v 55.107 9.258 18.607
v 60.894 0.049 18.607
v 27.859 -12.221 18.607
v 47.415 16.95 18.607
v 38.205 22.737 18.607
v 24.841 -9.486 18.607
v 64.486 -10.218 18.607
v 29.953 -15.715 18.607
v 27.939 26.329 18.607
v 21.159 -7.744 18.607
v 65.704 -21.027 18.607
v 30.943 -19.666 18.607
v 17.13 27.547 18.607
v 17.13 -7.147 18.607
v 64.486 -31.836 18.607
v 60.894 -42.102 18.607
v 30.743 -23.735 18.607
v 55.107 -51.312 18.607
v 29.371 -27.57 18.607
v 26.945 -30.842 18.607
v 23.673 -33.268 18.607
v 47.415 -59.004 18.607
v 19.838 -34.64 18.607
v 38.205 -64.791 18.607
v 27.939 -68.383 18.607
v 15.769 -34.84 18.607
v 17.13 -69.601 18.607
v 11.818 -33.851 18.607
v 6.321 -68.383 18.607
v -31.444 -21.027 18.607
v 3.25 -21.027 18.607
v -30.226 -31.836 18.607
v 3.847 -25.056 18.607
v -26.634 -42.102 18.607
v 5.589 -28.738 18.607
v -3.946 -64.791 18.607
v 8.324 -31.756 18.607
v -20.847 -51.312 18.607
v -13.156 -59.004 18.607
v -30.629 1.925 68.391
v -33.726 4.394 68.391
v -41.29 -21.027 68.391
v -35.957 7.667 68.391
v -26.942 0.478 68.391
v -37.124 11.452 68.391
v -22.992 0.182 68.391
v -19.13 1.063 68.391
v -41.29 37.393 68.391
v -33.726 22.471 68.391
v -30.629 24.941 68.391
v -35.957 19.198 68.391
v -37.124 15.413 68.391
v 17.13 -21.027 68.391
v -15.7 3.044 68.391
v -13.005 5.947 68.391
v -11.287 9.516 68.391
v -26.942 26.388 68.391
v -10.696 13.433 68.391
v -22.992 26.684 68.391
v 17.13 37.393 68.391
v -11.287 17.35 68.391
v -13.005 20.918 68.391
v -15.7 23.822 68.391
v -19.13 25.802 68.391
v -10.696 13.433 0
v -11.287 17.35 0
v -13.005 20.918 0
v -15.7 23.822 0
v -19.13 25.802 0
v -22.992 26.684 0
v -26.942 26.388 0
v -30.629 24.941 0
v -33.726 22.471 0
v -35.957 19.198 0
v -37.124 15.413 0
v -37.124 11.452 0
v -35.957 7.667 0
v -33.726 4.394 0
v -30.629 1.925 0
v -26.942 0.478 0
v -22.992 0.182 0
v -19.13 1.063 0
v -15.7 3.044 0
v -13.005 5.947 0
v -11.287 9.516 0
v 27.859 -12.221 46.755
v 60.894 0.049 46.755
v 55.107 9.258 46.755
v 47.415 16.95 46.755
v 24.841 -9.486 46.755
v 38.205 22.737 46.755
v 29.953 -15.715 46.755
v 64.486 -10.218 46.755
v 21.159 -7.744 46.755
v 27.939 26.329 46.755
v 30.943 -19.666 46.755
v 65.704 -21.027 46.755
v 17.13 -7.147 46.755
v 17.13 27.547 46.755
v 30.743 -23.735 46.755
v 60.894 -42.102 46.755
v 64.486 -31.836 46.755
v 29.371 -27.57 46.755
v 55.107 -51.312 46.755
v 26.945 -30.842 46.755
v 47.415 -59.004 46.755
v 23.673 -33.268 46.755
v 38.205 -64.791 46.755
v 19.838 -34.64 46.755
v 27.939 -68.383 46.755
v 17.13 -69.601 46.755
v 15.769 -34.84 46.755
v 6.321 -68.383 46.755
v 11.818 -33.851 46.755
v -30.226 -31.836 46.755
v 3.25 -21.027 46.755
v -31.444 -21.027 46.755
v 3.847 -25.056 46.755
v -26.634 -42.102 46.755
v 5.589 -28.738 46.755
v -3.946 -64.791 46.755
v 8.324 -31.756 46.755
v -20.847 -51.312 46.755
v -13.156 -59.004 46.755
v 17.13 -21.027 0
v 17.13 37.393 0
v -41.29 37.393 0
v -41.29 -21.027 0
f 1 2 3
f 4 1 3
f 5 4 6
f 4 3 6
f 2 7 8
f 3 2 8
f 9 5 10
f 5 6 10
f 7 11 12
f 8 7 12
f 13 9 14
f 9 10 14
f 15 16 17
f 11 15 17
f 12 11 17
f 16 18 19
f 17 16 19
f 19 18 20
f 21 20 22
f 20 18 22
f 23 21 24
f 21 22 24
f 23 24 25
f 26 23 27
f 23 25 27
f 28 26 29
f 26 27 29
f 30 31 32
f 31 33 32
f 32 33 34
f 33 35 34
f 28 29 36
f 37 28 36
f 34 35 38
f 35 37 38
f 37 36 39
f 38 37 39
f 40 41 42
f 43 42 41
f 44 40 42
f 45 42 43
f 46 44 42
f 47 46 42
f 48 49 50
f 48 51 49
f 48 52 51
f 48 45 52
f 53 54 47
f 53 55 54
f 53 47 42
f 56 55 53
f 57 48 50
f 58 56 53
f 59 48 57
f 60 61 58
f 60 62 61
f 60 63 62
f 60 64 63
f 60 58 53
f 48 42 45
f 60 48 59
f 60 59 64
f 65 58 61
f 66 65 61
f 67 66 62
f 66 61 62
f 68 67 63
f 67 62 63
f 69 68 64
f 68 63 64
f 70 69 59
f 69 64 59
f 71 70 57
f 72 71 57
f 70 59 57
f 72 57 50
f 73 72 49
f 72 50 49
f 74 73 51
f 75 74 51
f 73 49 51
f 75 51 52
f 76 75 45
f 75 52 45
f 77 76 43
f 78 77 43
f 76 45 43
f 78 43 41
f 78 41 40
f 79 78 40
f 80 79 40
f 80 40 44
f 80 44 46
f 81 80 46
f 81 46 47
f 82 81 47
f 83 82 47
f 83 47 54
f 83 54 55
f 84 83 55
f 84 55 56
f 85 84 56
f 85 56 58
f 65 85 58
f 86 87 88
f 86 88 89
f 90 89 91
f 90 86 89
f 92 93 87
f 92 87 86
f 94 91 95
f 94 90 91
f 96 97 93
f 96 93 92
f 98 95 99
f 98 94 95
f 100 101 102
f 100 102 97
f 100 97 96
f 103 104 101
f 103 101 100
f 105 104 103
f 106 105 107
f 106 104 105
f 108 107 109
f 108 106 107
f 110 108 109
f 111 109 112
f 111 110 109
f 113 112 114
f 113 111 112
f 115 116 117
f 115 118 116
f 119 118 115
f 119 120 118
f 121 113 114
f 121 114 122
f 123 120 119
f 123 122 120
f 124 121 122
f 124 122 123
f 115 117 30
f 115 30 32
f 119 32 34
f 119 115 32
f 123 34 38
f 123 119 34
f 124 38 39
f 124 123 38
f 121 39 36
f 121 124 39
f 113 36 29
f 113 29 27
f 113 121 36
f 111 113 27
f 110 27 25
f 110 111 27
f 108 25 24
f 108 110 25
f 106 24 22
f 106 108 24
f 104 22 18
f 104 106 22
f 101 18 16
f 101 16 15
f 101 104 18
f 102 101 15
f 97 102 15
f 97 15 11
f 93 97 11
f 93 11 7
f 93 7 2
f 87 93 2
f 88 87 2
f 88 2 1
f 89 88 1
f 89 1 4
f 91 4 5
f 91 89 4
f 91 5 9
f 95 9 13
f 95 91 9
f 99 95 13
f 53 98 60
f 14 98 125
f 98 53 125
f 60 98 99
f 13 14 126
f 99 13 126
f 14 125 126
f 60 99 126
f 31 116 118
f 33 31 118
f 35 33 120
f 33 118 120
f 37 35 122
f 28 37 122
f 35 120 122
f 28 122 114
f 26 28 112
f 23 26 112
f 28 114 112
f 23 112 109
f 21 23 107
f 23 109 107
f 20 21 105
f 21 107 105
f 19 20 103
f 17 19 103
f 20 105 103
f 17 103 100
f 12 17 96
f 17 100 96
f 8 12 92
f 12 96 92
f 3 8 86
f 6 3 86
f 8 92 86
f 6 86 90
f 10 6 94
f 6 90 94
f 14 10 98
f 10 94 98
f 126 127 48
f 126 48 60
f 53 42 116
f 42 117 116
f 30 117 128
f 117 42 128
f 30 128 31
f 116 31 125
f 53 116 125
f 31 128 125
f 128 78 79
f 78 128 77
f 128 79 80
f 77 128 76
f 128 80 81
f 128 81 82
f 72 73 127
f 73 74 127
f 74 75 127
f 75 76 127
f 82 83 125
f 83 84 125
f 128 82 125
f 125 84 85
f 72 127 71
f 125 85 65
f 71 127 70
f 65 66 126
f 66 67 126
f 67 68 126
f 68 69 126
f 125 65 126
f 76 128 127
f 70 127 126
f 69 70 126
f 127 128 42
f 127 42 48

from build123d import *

# Parameters (mm, degrees)
F0_W     = 58.42
F0_H     = 58.42
F1_DEPTH = 68.390979
F2_W     = 34.69379
F2_H     = 28.147937
F4_R     = 13.288258
F5_DEPTH = 140.97


with BuildPart() as f1:
    # F0 (on Top) → F1 (new body)
    with BuildSketch(Plane.XY):
        with Locations((-12.080159, 8.183077)):
            Rectangle(F0_W, F0_H)
    extrude(amount=F1_DEPTH)

    # F2 (on face) → F3 (revolve)
    with BuildSketch(Plane.XZ.offset(21.026923)):
        with Locations((-14.097282, 32.681106)):
            Rectangle(F2_W, F2_H)
    revolve(axis=Axis((17.129841, -21.026923, 34.195489), (0, 0, 1)))

    # F4 (on face) → F5 (cut)
    with BuildSketch(Plane.XY.offset(68.390979)):
        with Locations((-23.98462, 13.432804)):
            Circle(F4_R)
    extrude(amount=-F5_DEPTH, mode=Mode.SUBTRACT)


solid = f1.part
